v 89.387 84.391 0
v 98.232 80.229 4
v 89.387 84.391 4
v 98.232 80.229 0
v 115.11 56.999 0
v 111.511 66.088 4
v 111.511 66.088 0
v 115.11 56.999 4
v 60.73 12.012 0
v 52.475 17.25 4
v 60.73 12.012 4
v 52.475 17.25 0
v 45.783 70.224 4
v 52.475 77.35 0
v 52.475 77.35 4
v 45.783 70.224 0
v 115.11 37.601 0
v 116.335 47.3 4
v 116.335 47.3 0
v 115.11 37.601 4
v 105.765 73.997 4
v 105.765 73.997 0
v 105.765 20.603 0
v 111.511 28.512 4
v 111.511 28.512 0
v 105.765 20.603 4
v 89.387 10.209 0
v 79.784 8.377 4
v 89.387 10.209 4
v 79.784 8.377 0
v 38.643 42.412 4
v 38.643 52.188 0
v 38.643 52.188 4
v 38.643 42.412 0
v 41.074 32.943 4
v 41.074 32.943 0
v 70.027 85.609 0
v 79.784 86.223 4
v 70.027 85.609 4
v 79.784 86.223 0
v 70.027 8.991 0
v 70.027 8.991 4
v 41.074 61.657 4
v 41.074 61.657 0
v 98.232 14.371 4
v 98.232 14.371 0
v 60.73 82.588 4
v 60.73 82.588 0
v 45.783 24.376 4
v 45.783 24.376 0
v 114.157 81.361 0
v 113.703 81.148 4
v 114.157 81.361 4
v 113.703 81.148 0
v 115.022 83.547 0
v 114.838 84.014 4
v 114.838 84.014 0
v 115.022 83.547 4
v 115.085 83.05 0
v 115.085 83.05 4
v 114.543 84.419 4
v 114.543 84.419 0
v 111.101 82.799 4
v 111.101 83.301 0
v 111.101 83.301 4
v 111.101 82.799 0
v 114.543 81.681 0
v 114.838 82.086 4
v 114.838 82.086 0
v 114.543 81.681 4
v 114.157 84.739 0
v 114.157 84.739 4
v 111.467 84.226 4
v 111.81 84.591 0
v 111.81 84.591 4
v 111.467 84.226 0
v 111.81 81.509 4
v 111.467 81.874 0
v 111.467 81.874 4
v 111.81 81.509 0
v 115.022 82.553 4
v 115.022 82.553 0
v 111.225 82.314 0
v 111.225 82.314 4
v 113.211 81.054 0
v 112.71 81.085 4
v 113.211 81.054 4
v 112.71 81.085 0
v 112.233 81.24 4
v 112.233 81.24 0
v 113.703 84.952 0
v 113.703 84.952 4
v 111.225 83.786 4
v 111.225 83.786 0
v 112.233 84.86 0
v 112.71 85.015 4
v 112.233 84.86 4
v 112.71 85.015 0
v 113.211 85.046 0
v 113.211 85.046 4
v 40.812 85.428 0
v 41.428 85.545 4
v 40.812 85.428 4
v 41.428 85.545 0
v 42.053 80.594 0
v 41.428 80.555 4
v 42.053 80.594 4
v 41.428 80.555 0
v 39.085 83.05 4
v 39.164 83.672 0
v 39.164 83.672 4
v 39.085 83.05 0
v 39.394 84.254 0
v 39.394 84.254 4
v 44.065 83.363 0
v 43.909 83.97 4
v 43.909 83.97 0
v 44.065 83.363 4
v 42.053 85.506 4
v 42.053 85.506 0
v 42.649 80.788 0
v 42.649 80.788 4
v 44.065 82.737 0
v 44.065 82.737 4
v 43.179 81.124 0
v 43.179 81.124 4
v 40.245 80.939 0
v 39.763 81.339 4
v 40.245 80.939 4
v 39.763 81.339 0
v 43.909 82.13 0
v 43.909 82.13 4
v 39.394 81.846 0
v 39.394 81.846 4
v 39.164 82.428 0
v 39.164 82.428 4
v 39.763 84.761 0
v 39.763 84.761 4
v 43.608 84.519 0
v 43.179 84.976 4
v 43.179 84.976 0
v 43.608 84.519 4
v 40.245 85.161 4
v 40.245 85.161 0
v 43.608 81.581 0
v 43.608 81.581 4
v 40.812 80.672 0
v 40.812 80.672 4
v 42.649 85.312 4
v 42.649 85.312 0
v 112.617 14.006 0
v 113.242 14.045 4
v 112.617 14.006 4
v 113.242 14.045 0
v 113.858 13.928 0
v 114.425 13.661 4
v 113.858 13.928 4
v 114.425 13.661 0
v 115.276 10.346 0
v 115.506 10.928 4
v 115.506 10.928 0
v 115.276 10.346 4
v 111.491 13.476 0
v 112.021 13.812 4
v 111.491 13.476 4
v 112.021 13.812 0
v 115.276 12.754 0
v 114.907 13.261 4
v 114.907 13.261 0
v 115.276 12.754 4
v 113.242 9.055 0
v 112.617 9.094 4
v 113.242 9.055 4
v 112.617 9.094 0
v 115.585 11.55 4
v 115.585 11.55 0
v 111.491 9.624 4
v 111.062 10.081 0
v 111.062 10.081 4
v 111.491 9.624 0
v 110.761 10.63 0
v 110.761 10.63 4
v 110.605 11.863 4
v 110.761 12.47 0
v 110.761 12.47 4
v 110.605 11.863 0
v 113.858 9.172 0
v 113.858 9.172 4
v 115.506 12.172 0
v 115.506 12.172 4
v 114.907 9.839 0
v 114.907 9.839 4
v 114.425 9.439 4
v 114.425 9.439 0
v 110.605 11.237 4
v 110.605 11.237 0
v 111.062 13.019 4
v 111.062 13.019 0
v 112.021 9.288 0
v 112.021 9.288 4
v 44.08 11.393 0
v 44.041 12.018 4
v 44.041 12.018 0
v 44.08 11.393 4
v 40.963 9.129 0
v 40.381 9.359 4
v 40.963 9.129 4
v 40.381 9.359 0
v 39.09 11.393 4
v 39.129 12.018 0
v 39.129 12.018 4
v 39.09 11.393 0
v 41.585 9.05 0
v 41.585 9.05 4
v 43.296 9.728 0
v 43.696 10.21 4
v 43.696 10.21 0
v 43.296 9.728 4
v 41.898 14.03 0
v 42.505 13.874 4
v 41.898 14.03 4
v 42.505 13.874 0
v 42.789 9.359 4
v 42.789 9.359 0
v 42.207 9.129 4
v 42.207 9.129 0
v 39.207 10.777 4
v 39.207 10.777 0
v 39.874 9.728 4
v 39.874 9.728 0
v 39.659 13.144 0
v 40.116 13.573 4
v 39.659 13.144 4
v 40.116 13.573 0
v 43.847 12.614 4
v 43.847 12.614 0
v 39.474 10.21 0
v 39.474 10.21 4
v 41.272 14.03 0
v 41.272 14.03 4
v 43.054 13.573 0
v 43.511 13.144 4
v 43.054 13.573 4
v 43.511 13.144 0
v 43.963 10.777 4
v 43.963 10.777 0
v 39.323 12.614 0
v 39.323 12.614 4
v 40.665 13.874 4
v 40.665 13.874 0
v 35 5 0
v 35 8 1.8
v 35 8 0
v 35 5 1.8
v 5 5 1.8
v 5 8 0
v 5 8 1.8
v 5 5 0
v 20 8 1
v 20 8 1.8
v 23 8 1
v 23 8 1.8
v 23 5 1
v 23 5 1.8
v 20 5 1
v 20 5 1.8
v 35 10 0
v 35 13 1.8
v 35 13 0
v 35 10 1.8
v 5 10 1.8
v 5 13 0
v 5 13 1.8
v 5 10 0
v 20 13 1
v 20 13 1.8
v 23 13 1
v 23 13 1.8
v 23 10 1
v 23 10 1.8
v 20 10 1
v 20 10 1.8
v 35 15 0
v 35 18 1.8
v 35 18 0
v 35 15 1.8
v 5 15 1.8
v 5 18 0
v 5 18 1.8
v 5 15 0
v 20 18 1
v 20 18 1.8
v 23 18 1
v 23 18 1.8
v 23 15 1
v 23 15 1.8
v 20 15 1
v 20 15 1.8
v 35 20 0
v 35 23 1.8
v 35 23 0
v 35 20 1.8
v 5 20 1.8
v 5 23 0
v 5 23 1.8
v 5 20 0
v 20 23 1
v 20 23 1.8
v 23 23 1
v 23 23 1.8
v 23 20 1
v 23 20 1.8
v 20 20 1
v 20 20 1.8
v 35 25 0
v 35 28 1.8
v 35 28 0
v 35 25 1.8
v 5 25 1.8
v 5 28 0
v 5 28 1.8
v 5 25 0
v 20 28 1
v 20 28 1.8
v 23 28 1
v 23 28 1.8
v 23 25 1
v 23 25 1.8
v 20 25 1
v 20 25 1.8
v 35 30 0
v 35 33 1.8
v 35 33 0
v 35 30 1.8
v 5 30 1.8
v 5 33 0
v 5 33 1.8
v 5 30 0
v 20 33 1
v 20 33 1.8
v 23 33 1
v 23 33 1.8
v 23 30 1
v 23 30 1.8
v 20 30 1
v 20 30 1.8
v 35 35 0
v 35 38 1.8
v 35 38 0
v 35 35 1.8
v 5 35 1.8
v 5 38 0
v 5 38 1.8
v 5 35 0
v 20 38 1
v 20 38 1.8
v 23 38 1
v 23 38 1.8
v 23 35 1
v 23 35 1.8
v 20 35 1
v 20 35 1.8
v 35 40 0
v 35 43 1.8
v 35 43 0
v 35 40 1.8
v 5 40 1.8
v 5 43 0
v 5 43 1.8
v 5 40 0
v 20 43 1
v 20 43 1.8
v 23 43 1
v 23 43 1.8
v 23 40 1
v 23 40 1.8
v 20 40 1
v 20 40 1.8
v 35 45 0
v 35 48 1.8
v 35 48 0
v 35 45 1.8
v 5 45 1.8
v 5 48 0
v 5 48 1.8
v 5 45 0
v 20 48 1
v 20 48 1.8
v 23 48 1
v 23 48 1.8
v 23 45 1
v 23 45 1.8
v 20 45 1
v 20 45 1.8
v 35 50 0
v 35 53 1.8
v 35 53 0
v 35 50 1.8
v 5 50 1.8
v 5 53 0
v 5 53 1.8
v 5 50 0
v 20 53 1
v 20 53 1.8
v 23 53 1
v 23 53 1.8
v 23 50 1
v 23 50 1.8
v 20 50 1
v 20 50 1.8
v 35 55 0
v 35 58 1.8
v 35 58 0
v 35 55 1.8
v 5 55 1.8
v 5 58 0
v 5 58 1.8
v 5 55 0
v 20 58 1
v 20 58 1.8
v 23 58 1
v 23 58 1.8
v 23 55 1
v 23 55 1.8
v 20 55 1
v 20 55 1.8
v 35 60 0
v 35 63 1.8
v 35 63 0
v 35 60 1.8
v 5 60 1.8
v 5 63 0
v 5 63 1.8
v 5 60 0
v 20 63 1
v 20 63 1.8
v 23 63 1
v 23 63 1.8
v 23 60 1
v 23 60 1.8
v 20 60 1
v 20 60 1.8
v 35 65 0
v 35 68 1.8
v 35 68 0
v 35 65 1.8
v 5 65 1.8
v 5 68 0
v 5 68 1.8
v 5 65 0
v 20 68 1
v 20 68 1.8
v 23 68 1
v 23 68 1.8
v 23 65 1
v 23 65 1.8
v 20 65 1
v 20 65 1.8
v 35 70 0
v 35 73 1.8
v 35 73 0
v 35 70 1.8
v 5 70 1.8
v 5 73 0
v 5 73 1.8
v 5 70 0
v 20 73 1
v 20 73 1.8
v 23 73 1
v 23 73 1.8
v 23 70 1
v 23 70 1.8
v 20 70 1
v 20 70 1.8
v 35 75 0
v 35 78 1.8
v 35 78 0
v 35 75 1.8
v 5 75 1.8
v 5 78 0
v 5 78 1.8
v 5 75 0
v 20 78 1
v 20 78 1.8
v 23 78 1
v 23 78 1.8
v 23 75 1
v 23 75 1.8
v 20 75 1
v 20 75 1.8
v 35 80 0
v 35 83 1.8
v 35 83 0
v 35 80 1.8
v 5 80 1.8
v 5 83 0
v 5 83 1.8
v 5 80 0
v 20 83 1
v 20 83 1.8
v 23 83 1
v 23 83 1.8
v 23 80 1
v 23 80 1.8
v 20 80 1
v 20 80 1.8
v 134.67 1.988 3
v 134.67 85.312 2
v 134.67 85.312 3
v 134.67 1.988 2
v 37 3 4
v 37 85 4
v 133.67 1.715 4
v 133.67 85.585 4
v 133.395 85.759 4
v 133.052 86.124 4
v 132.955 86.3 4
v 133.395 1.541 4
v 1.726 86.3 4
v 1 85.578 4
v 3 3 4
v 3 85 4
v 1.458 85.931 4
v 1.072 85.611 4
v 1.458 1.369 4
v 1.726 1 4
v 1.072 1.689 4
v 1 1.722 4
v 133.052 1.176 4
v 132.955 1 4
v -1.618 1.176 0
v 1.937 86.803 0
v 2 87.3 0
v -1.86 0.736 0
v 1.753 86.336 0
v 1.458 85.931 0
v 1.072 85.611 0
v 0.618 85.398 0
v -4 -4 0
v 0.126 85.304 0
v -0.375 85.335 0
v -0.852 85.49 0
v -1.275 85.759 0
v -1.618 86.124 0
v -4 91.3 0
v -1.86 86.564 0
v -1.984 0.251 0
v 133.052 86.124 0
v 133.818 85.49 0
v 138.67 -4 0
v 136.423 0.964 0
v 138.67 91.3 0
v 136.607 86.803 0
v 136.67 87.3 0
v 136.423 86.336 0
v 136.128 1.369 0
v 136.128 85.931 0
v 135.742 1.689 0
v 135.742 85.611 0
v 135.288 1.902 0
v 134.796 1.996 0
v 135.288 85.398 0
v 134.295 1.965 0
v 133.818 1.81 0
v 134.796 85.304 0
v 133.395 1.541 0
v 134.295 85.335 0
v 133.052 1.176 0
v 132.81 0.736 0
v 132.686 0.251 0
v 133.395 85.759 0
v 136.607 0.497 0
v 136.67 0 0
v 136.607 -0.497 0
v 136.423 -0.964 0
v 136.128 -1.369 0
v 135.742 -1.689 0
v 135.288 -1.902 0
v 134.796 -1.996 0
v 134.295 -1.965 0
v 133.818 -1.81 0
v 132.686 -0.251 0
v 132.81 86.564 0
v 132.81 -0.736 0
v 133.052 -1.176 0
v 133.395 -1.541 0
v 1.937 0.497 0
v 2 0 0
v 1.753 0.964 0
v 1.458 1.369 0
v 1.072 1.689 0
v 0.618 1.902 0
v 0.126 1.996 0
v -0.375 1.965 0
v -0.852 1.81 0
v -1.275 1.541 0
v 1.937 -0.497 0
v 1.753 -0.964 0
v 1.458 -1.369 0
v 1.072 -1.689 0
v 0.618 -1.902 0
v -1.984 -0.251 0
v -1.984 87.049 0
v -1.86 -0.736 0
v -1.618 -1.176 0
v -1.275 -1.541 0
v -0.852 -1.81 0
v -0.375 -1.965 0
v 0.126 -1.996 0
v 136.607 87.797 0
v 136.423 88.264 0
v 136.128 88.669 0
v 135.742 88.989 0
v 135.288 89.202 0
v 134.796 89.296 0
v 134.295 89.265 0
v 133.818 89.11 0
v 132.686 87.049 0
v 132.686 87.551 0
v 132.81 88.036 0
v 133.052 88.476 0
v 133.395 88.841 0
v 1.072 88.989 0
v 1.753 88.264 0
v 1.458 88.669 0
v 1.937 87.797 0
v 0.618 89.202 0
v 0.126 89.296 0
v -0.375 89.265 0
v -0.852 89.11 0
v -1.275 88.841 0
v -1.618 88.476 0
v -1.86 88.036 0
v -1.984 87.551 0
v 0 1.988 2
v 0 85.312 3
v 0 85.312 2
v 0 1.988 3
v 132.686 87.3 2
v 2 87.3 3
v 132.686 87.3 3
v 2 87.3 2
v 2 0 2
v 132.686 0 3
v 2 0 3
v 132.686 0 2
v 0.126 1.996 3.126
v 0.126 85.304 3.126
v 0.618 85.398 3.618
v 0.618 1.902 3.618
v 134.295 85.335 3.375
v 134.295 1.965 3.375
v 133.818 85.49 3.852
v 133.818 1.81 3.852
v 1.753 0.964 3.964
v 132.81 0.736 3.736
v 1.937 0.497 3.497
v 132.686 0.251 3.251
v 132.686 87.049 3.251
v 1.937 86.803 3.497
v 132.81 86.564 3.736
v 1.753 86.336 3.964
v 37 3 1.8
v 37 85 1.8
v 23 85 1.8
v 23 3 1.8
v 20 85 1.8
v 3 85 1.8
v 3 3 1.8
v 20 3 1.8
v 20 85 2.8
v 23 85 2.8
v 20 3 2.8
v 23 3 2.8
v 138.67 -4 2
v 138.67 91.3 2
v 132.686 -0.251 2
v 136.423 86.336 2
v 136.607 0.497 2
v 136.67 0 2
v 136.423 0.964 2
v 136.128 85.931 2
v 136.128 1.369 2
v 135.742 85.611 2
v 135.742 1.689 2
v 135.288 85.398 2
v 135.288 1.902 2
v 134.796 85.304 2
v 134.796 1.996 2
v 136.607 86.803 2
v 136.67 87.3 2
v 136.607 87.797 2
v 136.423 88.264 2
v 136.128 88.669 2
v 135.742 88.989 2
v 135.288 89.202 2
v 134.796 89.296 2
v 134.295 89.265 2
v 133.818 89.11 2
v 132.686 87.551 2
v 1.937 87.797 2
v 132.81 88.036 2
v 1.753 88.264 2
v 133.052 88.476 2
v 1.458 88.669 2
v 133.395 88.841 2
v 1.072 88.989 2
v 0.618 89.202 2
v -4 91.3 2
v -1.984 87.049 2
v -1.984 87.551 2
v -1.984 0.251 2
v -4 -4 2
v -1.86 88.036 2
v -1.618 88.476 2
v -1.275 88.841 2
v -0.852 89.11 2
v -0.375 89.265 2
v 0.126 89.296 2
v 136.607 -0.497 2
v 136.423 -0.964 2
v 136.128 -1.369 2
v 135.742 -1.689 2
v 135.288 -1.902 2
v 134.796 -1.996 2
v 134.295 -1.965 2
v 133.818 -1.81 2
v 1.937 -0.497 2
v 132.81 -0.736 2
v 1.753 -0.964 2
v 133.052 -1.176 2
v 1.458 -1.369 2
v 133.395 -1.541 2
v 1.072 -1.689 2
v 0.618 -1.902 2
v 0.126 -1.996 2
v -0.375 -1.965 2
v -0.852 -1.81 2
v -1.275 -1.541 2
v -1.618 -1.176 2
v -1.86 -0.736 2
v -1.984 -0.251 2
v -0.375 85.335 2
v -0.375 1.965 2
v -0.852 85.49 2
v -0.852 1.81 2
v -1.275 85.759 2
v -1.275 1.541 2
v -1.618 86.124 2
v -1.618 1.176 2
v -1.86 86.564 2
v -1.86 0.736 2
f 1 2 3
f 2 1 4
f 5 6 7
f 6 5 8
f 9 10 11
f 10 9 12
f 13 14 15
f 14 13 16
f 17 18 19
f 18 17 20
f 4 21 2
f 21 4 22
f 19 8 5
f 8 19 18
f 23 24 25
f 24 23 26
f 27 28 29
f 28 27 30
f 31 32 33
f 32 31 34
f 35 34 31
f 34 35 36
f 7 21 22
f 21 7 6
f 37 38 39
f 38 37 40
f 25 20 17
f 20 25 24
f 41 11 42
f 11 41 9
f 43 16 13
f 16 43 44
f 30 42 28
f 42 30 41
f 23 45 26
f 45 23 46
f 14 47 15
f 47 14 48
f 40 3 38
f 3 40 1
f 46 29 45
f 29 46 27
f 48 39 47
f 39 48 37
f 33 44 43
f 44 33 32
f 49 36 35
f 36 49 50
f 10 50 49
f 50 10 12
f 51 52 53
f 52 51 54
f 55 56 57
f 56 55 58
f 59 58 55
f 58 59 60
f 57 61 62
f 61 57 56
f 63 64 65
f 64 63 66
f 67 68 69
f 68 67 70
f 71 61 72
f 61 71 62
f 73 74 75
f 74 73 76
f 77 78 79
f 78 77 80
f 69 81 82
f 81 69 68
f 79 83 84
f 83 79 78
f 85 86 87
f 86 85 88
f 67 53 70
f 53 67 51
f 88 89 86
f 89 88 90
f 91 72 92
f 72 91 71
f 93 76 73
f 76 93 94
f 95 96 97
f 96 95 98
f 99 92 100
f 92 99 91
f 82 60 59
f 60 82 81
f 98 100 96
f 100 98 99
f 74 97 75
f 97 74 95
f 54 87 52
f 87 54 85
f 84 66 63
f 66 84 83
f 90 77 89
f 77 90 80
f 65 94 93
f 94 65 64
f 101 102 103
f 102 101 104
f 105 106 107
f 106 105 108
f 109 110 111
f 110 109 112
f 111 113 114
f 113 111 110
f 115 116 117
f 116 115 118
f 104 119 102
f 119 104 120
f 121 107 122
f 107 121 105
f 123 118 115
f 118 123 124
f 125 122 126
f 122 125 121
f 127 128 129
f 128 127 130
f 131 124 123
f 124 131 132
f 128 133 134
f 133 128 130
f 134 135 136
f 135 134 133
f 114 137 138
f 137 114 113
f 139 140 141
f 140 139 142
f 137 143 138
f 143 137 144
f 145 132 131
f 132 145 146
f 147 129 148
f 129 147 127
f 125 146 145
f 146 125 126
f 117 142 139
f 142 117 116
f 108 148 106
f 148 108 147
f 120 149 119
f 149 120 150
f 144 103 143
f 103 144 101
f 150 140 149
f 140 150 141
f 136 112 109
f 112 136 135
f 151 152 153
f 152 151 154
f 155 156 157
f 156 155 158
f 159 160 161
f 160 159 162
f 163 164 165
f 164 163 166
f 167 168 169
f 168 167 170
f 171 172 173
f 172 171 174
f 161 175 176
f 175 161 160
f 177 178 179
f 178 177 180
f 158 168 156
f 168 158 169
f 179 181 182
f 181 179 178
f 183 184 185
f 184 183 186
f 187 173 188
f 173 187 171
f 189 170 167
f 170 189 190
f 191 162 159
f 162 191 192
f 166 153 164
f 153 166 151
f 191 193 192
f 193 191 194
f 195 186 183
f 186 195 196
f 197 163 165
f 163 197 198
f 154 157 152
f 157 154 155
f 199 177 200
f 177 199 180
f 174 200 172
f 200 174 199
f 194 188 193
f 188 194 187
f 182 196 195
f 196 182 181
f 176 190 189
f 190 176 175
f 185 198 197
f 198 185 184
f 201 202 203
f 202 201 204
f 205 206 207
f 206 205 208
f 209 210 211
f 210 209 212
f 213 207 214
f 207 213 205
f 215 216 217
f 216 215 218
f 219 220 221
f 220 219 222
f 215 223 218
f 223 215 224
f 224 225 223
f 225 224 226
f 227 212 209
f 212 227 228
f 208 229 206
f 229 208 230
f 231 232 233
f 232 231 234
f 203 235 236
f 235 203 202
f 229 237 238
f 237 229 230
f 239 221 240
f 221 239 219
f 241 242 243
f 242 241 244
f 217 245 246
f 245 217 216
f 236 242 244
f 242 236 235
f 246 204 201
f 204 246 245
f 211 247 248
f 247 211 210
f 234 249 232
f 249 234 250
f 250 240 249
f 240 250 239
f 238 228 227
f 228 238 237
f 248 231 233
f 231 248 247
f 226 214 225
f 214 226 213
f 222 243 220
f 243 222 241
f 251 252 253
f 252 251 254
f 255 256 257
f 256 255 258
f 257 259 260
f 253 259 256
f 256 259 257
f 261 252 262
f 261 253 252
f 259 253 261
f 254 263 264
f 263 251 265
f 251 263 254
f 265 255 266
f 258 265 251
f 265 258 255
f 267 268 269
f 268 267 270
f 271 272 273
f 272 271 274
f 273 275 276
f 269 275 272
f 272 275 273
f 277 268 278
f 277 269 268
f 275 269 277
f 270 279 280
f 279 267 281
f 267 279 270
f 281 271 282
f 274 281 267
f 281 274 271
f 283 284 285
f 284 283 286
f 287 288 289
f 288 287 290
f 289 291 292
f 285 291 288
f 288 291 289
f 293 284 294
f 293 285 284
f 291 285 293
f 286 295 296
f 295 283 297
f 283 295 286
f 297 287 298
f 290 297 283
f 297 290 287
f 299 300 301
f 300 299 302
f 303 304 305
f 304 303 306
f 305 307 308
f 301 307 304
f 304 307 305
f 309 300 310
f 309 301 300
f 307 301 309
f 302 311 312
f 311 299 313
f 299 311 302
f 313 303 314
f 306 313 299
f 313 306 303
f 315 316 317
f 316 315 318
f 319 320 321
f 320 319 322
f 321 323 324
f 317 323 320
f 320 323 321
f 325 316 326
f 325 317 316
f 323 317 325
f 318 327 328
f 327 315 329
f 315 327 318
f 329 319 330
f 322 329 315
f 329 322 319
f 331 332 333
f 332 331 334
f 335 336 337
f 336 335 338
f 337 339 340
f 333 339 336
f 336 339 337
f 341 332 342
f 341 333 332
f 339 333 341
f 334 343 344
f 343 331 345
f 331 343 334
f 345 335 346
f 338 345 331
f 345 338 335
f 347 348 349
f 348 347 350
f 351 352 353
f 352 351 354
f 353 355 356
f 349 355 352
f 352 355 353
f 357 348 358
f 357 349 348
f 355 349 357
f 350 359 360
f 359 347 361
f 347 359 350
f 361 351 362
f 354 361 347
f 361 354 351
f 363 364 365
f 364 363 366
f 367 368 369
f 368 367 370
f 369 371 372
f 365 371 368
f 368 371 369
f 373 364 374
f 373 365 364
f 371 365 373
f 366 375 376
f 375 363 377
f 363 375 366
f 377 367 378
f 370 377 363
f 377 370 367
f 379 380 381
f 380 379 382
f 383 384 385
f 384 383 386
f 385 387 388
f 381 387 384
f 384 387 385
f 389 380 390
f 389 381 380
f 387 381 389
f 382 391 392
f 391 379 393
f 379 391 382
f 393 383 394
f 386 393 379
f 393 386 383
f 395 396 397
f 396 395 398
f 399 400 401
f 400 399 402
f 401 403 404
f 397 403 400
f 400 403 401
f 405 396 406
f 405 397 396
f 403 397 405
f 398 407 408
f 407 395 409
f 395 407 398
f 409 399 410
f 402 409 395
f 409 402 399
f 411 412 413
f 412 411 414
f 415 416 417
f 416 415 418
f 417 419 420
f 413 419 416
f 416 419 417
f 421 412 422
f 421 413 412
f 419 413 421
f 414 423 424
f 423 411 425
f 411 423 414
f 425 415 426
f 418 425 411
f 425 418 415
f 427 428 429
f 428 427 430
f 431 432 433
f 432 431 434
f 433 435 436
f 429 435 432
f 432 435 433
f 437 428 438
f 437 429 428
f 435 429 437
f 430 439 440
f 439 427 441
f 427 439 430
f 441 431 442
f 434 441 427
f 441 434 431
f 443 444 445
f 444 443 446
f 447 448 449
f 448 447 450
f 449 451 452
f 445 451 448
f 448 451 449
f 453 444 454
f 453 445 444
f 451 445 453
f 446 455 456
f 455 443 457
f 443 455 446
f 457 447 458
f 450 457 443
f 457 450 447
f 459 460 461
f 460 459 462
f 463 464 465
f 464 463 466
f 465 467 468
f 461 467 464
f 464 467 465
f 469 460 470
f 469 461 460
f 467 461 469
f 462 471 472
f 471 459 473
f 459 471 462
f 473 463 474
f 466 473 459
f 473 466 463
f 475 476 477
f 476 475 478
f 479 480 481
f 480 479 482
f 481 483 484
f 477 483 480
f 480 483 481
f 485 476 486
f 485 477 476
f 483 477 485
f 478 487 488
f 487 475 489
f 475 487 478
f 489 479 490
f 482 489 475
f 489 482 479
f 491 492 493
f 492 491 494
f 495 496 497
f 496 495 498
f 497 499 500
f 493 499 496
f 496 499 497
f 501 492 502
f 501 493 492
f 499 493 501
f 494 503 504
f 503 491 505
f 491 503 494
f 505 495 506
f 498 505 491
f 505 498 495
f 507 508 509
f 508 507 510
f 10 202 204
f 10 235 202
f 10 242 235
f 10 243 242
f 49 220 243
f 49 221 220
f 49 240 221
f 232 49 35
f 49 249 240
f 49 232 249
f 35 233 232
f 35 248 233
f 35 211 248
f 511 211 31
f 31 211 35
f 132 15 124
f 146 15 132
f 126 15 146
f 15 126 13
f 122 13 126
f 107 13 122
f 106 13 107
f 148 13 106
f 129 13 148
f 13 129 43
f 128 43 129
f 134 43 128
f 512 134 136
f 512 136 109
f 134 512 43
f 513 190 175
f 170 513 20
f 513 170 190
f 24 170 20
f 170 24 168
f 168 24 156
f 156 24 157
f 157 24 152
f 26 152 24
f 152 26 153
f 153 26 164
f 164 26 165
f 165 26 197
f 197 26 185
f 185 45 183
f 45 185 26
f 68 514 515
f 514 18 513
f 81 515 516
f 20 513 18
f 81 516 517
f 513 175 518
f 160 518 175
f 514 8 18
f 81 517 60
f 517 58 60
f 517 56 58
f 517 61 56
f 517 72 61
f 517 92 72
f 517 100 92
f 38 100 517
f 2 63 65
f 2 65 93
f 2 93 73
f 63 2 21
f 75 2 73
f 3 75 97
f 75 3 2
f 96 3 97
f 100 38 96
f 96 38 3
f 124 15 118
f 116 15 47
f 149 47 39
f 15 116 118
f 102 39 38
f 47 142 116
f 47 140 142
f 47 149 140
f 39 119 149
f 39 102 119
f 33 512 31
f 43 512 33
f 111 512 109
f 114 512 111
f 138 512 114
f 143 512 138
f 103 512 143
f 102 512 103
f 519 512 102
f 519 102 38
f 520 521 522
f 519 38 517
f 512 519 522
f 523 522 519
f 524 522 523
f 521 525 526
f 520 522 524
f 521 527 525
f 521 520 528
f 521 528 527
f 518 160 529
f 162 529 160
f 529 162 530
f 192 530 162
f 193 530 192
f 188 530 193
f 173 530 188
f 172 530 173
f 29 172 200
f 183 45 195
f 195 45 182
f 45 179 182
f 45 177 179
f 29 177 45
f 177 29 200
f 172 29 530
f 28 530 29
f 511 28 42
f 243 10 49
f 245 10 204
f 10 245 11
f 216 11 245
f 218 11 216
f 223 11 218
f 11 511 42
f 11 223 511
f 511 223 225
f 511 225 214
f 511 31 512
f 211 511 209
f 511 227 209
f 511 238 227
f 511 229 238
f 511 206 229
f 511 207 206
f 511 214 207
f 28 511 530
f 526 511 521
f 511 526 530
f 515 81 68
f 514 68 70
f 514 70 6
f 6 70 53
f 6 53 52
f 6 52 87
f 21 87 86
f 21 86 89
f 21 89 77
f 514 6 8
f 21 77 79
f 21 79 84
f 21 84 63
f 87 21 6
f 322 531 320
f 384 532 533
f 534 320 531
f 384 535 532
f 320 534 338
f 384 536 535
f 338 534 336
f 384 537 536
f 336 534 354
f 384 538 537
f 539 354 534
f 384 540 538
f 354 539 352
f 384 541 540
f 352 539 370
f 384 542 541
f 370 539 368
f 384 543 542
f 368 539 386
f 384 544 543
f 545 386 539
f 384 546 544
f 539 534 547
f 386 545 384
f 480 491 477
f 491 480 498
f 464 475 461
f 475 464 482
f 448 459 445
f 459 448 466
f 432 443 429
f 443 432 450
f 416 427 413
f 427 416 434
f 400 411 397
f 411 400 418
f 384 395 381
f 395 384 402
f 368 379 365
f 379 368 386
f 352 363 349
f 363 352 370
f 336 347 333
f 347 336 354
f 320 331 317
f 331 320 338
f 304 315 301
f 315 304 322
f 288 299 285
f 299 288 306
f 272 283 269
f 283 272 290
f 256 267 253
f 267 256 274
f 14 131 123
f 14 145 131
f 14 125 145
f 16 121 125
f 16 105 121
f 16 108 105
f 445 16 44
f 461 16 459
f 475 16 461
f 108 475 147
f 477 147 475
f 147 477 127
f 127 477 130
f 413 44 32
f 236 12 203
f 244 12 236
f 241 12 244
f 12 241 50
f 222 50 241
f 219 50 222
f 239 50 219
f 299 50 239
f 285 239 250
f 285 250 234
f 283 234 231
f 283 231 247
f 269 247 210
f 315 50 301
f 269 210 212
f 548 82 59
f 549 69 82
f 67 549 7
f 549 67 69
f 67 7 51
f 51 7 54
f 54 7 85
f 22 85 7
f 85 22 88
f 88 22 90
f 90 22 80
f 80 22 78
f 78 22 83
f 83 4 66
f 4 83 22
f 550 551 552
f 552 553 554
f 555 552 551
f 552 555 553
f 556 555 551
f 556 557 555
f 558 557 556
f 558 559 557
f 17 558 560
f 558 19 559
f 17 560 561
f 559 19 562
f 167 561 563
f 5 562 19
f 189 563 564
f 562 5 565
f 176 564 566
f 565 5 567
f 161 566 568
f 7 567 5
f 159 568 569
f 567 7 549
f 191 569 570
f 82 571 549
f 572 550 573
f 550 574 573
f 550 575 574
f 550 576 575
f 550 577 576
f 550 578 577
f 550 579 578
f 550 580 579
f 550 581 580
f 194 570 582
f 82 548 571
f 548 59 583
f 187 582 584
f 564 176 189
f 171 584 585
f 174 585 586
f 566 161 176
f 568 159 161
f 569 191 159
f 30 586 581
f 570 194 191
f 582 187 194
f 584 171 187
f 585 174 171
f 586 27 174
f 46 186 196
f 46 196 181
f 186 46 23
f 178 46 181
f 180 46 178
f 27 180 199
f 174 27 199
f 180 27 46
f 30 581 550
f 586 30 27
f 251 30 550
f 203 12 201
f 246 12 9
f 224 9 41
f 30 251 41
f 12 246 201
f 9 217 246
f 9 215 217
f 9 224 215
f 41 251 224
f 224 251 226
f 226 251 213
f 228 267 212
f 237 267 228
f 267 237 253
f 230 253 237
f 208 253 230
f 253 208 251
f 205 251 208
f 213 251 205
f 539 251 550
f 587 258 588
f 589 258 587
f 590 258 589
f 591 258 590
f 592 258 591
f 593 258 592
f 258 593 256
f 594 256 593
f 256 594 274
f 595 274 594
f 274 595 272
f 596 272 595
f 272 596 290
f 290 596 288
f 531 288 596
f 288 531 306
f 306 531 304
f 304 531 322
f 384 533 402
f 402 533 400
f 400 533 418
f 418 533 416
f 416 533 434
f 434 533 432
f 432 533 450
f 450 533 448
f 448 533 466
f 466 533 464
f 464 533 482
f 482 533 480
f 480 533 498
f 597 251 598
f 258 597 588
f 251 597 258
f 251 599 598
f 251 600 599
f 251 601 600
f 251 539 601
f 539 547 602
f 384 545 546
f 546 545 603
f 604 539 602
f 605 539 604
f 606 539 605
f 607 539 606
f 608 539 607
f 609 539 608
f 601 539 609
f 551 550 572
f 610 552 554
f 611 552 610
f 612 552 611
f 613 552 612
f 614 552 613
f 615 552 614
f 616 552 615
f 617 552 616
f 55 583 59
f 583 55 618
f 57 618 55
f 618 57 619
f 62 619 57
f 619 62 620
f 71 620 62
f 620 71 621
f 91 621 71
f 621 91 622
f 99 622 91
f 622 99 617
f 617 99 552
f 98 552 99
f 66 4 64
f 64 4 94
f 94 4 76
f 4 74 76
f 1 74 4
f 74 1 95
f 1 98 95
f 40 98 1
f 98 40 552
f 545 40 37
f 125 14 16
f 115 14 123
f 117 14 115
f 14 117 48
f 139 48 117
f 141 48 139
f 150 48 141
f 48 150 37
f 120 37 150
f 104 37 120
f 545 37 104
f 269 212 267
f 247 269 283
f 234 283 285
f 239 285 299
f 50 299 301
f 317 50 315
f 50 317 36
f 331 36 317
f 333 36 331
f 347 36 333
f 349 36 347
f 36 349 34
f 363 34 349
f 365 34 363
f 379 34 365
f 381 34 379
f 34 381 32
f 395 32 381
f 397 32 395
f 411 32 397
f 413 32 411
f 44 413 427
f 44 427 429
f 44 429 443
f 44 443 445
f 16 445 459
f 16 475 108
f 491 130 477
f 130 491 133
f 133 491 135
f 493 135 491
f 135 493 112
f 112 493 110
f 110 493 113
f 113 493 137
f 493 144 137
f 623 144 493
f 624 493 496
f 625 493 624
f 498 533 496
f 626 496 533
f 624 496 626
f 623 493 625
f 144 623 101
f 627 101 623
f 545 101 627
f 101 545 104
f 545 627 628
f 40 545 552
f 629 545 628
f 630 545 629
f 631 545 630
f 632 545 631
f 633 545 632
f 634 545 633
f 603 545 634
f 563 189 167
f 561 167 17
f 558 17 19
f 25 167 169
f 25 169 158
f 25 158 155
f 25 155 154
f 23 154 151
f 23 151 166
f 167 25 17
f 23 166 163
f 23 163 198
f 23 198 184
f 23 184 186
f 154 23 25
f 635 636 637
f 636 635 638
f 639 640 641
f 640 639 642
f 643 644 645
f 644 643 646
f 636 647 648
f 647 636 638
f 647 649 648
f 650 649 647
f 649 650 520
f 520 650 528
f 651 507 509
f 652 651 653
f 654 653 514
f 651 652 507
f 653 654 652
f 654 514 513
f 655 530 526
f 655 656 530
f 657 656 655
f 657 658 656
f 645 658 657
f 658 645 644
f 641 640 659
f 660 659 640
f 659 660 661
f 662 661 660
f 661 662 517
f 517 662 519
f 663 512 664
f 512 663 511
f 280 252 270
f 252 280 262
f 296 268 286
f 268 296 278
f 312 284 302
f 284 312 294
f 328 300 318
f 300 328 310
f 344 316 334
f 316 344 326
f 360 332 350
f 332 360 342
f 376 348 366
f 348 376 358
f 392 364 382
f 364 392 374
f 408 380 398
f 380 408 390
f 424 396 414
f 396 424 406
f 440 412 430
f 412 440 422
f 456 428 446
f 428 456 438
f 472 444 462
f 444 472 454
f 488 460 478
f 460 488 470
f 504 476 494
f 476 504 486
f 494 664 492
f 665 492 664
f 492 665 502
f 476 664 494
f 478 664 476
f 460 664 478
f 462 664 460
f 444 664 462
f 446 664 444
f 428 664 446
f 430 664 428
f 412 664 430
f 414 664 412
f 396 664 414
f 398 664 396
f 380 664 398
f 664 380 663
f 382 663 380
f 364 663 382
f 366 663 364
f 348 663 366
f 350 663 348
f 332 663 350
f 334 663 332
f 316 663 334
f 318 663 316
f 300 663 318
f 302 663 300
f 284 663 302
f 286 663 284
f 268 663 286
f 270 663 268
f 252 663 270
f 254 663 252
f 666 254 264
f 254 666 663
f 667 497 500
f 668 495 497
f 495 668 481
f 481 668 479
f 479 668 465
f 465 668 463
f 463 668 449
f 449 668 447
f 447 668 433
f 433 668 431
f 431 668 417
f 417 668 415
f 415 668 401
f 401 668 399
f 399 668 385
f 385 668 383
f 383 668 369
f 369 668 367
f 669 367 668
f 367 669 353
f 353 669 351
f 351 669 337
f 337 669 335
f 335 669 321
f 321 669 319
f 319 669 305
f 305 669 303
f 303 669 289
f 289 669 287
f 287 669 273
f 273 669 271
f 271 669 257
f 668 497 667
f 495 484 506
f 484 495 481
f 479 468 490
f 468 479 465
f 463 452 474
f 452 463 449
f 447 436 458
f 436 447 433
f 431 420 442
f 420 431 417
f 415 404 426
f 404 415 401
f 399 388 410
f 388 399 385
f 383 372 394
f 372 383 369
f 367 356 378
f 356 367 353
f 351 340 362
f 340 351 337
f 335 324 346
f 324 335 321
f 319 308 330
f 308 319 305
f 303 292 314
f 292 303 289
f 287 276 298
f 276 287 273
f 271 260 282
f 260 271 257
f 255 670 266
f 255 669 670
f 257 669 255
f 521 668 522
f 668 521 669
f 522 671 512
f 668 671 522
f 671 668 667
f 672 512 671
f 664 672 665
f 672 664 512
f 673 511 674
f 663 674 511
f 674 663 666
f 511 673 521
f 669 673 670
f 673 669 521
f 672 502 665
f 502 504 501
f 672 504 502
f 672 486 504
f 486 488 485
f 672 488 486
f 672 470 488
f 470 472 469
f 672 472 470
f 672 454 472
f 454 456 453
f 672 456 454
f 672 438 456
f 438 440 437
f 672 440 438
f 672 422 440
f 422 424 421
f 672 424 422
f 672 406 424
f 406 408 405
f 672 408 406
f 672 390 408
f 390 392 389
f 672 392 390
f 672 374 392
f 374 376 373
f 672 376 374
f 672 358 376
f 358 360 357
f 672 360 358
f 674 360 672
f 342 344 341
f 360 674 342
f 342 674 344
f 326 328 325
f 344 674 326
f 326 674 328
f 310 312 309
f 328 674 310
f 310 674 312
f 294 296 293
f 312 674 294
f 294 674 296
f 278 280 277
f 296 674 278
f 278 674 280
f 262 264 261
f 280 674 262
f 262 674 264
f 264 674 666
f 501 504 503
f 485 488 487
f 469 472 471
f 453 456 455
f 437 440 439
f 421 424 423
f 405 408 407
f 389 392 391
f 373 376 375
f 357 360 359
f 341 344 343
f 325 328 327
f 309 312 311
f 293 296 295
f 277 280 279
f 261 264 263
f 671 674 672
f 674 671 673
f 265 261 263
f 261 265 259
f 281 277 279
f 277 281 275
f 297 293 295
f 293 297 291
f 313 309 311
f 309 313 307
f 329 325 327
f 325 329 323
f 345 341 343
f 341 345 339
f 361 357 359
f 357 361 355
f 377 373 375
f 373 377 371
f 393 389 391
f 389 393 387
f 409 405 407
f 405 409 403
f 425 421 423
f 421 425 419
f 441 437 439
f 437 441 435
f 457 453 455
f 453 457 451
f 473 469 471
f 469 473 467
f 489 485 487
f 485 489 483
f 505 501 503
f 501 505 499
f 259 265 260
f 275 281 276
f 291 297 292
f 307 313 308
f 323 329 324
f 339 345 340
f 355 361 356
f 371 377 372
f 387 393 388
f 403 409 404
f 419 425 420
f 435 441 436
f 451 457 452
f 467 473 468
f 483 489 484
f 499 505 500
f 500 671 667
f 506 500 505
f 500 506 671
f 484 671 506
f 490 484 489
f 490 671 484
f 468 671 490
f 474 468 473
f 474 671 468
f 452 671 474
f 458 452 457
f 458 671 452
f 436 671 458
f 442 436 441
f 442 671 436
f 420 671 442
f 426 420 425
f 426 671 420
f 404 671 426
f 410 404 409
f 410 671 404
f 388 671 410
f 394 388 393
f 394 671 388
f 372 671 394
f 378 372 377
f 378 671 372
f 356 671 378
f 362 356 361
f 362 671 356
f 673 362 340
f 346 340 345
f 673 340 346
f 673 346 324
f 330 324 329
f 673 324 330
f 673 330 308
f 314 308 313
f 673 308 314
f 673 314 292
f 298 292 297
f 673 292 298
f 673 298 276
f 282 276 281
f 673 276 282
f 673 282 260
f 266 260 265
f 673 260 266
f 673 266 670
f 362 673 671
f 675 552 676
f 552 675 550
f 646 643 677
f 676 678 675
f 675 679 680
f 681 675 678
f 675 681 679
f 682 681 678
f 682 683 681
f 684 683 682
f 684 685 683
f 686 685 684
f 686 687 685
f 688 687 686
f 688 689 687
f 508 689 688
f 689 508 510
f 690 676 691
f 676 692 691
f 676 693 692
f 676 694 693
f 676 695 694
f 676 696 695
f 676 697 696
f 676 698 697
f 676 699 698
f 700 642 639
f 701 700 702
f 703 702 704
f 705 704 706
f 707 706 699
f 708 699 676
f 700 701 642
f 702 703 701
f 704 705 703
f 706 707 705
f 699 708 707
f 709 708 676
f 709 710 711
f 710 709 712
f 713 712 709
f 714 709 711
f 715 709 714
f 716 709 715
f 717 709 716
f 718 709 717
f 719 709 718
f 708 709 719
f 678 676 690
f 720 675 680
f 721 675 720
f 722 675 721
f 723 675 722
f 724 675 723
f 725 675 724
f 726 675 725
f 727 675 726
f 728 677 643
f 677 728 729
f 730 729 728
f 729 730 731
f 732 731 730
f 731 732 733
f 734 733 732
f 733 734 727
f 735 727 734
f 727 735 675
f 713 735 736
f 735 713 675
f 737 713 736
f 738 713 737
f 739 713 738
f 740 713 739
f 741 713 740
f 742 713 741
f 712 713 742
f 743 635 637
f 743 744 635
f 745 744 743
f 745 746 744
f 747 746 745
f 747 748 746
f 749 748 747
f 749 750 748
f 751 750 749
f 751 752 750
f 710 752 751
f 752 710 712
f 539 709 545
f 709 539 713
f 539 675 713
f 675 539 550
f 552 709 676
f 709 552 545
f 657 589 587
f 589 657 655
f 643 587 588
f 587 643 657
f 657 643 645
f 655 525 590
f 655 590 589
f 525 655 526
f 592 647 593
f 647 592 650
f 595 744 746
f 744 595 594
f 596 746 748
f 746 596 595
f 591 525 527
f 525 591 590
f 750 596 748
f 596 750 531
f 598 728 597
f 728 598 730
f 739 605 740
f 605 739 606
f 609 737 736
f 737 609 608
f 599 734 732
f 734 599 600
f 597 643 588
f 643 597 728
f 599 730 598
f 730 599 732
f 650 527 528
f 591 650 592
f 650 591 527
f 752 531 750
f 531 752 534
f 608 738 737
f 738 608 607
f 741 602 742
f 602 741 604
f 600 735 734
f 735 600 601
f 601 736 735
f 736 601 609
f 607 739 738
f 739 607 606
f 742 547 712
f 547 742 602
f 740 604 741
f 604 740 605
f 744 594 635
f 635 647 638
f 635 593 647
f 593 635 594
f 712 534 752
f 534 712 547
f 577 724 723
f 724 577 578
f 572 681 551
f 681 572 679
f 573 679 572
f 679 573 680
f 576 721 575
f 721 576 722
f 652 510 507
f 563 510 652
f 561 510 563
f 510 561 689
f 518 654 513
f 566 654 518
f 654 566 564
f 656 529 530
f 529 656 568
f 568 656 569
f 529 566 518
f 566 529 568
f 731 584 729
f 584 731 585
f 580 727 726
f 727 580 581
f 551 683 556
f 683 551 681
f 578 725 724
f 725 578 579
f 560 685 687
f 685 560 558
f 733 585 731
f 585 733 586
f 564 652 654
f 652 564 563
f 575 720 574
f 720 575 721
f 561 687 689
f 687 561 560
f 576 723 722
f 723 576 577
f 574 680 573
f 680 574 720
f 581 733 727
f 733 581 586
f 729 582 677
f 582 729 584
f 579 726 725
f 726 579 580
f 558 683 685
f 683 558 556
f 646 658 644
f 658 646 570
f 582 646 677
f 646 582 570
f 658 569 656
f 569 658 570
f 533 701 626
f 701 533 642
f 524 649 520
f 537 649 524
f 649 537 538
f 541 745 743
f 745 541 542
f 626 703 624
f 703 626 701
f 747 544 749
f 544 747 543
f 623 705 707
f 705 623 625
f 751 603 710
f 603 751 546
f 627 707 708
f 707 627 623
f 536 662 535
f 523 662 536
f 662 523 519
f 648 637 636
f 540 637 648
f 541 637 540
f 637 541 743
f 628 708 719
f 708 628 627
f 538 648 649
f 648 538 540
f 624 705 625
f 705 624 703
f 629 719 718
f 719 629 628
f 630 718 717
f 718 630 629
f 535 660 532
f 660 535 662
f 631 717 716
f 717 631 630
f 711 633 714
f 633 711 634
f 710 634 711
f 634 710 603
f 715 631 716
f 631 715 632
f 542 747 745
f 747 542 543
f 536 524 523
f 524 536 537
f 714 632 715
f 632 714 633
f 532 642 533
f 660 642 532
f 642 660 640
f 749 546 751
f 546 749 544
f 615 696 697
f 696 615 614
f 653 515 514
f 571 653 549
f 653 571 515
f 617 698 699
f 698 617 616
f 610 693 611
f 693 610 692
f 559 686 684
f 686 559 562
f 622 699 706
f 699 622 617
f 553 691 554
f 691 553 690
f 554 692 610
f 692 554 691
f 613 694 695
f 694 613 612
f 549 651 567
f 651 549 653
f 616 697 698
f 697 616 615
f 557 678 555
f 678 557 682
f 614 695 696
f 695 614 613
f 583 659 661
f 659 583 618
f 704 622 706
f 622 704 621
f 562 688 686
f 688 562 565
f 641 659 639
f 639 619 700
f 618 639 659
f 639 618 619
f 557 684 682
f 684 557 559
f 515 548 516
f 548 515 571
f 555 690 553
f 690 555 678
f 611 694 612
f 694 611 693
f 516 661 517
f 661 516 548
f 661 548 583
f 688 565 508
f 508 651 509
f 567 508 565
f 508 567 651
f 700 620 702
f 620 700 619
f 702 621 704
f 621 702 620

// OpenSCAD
// file: ../vitamins/fasteners.scad
module m3_square_nut() {
    color("Silver") {
        translate([0,0,1.85/2]) {
            difference() {
                cube([5.45,5.45,1.85]);
                translate([5.45/2,5.45/2,-5])cylinder(d=3, h=10, $fn=30);
            }
        }
    }
}

m3_square_nut();
// file: ../vitamins/fan.scad
module fan_80mm() {
    color("DarkSlateGray")difference() {
        // main body
        translate([-40,-40,0]) {
            hull() {
                translate([2.8,2.8,0])cylinder(h=25, r=2.8);
                translate([80-2.8,2.8,0])cylinder(h=25, r=2.8);
                translate([2.8,80-2.8,0])cylinder(h=25, r=2.8);
                translate([80-2.8,80-2.8,0])cylinder(h=25, r=2.8);
            }
        }

        // fan hole
        translate([0,0,-1])cylinder(h=25+2, d=75);

        // mount holes
        translate([71.5/2,71.5/2,-1])cylinder(h=25+2, d=4);
        mirror([1,0,0])translate([71.5/2,71.5/2,-1])cylinder(h=25+2, d=4);
        mirror([0,1,0])translate([71.5/2,71.5/2,-1])cylinder(h=25+2, d=4);
        mirror([1,1,0])translate([71.5/2,71.5/2,-1])cylinder(h=25+2, d=4);
    }
}

module fancut_80mm(depth) {
    cylinder(h=depth, d=78);
    translate([71.5/2,71.5/2,0])cylinder(h=depth, d=4);
    mirror([1,0,0])translate([71.5/2,71.5/2,0])cylinder(h=depth, d=5);
    mirror([0,1,0])translate([71.5/2,71.5/2,0])cylinder(h=depth, d=5);
    mirror([1,1,0])translate([71.5/2,71.5/2,0])cylinder(h=depth, d=5);
}

fan_80mm();
// file: ../settings/mods.scad
module cylinder_outer(height,radius,fn) {
   fudge = 1/cos(180/fn);
   cylinder(h=height,r=radius*fudge,$fn=fn);
}
// file: ../settings/dimensions.scad
// Defualt Quality
$fn = 25;

// PCB Dimensions - mm
pcb_l = 109.67;
pcb_w = 84.30;
pcb_t = 1.6;

hole_dia = 3.2;
hole_x_spacing = 101.85;
hole_y_spacing = 76.10;

// PCB Component Locations - mm from center
usb_x = (-pcb_l/2) + 24.11;
usb_y = (-pcb_w/2);

uSD_x = (-pcb_l/2) + 42.46;
uSD_y = (-pcb_w/2) - 0.71;

// TMC2130 Dimensions - mm
tmc_l = 20.32;
tmc_w = 15.24;
tmc_t = 1.6;
tmc_offset_from_pcb = 11.05;


// Global Enclosure Settings
pcb_mnt_pattern = [[0,0],[hole_x_spacing,0],[0,hole_y_spacing],[hole_x_spacing,hole_y_spacing]];
x_clearance = 25;
y_clearance = 3;
m3_clearance_dia = 3.2;
wall_height = 38;
// main file
include <../settings/dimensions.scad>
use <../settings/mods.scad>
use <../vitamins/fan.scad>
use <../vitamins/fasteners.scad> // for preview

module enclosure_front() {
    difference() {
        union() {
            difference() {
                // lid inset
                cube([pcb_l+x_clearance,pcb_w+y_clearance,4]);

                // chamfer
                t = 2;
                chamfer_h = 3;
                translate([0,0,((t/2)/cos(45)) + chamfer_h])rotate([0,45,0])cube([t,400,6],center=true);
                translate([pcb_l+x_clearance,0,((t/2)/cos(45)) + chamfer_h])rotate([0,315,0])cube([t,400,6],center=true);

                translate([0,0,((t/2)/cos(45)) + chamfer_h])rotate([0,45,90])cube([t,400,6],center=true);
                translate([0,pcb_w+y_clearance,((t/2)/cos(45)) + chamfer_h])rotate([0,315,90])cube([t,400,6],center=true);

                // Fan holes
                translate([((pcb_l+x_clearance)/2)+10,(pcb_w+y_clearance)-40,-1]){
                    fancut_80mm(depth=6);
                }

                // Vents
                for (i=[5:5:80]) {
                    translate([5,i,-1])cube([30,3,10]);
                }
                translate([3,3,1.8])cube([34,82,5]);

            }

            // Vent horizontal support bar
            translate([20,3,1])cube([3,82,1.8]);

            // Edges
            translate([-4,-4,0])cube([pcb_l+x_clearance+8,4,2]);
            translate([-4,pcb_w+y_clearance,0])cube([pcb_l+x_clearance+8,4,2]);
            translate([-4,0,0])cube([4,pcb_w+y_clearance,2]);
            translate([pcb_l+x_clearance,0,0])cube([4,pcb_w+y_clearance,2]);
        }

            // Lid Screw Holes
        translate([0,0,-1])cylinder(h=21, d=4);
        translate([pcb_l+x_clearance,0,-1])cylinder(h=21, d=4);
        translate([0,pcb_w+y_clearance,-1])cylinder(h=21, d=4);
        translate([pcb_l+x_clearance,pcb_w+y_clearance,-1])cylinder(h=21, d=4);
    }
}

enclosure_front();
